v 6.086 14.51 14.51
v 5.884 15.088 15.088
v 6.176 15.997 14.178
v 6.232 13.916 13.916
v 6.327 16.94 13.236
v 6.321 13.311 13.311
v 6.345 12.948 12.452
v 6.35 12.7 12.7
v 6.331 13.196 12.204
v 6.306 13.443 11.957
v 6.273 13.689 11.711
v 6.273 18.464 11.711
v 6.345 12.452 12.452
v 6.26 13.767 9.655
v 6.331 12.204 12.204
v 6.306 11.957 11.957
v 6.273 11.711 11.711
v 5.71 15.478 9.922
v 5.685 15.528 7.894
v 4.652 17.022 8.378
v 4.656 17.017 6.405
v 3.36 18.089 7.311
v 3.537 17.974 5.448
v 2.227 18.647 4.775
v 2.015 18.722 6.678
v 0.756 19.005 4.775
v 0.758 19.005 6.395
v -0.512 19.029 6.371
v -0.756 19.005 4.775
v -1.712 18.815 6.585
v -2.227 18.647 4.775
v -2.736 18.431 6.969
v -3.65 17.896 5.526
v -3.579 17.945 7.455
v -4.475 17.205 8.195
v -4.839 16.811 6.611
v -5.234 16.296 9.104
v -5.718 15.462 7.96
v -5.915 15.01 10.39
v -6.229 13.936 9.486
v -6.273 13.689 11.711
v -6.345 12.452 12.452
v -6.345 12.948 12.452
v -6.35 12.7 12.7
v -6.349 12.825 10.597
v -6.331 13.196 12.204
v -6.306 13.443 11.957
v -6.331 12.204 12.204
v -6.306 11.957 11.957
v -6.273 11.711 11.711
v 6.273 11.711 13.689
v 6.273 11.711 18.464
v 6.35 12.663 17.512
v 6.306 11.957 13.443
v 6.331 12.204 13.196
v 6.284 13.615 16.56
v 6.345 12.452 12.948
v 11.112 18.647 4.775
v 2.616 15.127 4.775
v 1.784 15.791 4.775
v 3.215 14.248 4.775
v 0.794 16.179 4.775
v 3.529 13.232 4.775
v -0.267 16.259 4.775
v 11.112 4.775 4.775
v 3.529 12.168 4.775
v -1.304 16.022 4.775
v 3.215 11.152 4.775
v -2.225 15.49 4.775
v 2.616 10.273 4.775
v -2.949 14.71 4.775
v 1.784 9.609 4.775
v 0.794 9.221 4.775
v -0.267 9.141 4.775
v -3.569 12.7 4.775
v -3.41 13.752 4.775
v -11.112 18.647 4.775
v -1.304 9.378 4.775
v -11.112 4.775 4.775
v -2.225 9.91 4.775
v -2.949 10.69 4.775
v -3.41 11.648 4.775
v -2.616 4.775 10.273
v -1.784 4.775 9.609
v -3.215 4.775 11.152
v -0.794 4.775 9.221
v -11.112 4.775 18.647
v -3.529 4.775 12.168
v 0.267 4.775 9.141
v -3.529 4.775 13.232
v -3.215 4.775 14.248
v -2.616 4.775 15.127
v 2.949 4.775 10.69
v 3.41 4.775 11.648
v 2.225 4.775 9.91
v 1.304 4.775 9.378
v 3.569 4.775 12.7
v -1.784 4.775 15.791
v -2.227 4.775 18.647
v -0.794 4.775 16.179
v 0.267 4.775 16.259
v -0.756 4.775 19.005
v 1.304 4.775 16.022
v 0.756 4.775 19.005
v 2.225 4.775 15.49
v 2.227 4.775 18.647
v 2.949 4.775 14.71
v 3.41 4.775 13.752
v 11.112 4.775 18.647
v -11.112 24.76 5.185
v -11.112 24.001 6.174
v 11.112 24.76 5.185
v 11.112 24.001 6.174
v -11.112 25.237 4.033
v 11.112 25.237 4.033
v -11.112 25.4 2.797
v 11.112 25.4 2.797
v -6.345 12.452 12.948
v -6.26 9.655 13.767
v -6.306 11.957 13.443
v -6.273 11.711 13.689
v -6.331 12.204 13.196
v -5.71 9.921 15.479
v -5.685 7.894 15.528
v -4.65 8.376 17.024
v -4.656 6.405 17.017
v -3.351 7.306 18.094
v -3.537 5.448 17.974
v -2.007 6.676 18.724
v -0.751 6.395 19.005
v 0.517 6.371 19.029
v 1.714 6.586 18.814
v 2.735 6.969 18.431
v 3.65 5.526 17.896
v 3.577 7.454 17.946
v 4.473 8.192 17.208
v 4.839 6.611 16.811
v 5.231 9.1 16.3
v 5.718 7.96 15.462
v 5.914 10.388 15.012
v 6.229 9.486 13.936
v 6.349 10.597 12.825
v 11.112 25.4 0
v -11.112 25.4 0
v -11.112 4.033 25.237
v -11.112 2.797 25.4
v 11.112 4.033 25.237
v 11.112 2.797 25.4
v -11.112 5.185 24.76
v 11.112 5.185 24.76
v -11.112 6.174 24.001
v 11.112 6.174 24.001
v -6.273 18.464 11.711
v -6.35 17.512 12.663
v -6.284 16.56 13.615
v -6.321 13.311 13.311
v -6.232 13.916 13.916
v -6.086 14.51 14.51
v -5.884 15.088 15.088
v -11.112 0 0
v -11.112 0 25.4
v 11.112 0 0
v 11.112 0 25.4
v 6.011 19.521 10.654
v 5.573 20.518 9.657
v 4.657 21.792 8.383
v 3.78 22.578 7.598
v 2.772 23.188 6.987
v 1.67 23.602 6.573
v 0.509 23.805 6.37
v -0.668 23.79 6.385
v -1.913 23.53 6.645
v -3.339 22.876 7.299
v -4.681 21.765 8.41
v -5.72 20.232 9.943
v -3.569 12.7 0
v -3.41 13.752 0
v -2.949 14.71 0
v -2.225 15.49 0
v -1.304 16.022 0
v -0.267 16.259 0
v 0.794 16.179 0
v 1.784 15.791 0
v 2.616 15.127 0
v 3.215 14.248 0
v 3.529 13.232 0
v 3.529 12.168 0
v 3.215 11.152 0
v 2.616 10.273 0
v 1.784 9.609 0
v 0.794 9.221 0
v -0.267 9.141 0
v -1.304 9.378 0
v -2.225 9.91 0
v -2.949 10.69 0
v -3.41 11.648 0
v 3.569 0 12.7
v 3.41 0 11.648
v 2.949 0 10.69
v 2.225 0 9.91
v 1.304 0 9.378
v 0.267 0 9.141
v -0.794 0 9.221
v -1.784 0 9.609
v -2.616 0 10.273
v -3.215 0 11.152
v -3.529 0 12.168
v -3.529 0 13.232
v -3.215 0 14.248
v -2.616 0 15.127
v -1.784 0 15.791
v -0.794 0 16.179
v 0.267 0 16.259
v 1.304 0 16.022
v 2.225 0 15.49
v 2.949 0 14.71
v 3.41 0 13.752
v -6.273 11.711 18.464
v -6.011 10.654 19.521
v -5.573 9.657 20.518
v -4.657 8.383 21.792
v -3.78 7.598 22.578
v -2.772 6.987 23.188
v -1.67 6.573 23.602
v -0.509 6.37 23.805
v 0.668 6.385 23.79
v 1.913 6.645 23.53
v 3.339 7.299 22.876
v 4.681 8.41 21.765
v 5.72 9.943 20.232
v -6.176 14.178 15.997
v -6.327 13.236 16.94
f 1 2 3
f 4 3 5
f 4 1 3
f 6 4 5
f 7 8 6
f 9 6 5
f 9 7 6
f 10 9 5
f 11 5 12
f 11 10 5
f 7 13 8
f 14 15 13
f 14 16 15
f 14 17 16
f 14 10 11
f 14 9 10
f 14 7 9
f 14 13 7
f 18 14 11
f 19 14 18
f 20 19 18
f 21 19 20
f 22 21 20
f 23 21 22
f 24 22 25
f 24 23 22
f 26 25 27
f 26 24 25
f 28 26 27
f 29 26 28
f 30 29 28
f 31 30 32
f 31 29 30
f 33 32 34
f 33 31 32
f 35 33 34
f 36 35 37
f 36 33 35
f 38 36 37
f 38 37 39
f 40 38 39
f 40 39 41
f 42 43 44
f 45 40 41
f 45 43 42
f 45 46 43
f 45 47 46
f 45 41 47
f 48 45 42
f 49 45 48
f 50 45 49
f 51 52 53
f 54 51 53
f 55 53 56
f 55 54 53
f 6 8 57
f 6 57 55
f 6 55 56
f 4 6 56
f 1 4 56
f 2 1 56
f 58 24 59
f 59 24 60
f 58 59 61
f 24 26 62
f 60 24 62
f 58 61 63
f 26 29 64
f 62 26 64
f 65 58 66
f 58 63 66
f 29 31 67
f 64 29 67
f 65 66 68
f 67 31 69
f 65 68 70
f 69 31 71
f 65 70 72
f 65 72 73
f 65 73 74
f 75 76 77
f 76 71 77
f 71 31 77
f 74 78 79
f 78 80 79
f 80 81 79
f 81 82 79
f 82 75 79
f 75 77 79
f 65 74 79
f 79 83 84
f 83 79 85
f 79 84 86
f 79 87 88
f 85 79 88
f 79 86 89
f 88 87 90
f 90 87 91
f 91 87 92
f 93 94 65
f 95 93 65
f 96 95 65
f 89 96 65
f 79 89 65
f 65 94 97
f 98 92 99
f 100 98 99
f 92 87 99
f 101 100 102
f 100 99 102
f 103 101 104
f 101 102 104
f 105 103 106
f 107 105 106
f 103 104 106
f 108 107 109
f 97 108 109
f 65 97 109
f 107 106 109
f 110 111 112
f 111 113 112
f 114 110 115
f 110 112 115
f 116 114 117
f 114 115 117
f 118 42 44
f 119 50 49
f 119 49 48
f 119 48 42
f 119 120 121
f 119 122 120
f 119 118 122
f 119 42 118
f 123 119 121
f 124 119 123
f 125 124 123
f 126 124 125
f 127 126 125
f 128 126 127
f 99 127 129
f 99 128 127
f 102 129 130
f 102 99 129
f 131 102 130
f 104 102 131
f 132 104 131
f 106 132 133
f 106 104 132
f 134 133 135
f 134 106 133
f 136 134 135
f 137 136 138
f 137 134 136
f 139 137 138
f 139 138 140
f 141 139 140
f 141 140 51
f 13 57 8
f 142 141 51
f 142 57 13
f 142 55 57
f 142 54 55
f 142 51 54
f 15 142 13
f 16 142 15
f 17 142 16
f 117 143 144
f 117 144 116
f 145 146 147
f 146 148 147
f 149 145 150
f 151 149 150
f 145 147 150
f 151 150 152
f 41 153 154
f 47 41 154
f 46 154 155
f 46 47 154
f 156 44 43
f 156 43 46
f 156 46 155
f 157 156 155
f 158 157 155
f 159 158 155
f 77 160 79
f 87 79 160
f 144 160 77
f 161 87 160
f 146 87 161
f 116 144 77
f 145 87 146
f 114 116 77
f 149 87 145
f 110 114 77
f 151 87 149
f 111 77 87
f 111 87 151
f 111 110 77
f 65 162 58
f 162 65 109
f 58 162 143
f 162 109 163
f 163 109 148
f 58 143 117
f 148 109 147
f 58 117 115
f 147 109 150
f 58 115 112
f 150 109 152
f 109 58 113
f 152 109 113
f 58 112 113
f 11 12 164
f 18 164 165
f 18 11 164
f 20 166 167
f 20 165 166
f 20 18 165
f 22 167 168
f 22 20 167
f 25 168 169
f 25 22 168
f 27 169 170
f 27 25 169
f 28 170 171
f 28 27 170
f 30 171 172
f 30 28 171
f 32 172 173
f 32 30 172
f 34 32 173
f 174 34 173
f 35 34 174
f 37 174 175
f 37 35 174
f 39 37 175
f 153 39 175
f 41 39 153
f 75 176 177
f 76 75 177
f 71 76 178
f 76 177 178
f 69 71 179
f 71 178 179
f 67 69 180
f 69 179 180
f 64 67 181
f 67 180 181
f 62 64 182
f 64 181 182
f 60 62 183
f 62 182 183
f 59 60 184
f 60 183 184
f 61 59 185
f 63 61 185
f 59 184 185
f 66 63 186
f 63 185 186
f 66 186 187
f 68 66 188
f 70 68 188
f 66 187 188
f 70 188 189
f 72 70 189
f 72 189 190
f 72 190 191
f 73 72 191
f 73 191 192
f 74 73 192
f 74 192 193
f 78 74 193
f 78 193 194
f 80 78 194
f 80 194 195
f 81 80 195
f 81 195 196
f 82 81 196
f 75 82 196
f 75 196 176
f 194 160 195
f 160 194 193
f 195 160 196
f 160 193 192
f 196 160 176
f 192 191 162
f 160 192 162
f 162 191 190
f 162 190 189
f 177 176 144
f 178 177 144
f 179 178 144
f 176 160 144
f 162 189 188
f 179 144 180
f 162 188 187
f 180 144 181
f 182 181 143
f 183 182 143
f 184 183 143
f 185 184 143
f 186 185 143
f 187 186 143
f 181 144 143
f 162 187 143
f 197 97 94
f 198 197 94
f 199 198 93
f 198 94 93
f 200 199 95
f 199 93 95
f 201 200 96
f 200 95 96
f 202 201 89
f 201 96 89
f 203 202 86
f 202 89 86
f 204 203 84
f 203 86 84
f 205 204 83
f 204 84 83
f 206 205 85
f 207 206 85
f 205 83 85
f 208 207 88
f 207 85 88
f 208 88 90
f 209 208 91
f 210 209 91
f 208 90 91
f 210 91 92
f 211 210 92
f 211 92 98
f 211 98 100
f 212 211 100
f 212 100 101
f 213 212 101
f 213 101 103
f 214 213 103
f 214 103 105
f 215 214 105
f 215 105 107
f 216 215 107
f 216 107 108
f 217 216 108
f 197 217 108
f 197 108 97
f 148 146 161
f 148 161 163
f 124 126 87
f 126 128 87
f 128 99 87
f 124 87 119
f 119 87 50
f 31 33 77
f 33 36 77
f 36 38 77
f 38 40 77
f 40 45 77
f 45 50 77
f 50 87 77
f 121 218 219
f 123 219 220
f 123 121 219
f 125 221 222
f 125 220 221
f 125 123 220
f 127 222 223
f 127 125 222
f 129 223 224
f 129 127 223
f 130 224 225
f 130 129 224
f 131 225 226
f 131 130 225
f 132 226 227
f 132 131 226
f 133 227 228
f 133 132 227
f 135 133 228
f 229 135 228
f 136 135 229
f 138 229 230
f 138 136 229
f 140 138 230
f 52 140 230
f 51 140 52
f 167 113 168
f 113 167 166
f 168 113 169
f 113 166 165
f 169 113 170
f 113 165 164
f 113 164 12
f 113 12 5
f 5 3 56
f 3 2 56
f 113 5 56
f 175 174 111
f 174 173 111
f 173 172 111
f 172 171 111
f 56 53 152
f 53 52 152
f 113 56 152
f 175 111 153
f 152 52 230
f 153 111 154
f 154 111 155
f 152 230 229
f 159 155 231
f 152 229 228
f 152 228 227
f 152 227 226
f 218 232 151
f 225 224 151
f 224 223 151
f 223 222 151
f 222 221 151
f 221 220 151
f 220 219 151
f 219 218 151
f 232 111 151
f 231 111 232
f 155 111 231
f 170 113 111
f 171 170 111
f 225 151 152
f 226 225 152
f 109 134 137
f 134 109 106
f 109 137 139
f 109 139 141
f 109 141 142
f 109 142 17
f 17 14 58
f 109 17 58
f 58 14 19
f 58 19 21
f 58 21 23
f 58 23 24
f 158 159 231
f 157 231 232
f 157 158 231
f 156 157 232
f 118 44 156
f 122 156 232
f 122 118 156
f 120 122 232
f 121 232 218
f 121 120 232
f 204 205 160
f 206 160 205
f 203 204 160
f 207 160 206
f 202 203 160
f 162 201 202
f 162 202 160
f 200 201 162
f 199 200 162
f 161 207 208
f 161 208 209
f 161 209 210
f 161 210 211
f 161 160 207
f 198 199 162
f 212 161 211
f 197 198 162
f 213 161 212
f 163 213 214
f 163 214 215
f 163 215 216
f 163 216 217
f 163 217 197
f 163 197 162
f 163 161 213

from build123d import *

# Parameters (mm, degrees)
BOSS_EXTRUDE1_START      = -11.1125
BOSS_EXTRUDE1_DEPTH      = 22.225
BOSS_EXTRUDE1_START_2    = 4.7752
BOSS_EXTRUDE1_2_DEPTH    = 20.6248
BOSS_EXTRUDE1_START_3    = 4
BOSS_EXTRUDE1_3_DEPTH    = 21.4
SKETCH2_W                = 22.225
SKETCH2_H                = 25.4
BOSS_EXTRUDE2_DEPTH      = 4.7752
K_0_281_DIAMETER_HOLE1_D = 7.1374
K_0_281_DIAMETER_HOLE2_D = 7.1374
FILLET1_R                = 4.7752


with BuildPart() as part:
    # Boss-Extrude1: read off the stored shape, not the designer's step
    # Boss-Extrude1 outline → Boss-Extrude1 (new body)
    with BuildSketch(Plane.YZ.offset(BOSS_EXTRUDE1_START)):
        Polygon((25.4, 4.7752), (4.7752, 25.4), (4.7752, 18.646847397), (18.646847397, 4.7752), (4.7752, 4.7752), (4.7752, 0), (25.4, 0), align=None)
    extrude(amount=BOSS_EXTRUDE1_DEPTH)

    # Boss-Extrude1 2 outline → Boss-Extrude1 2 (cut)
    with BuildSketch(Plane.XY.offset(BOSS_EXTRUDE1_START_2)):
        with BuildLine():
            ThreePointArc((6.272513521, 11.711023698), (0, 19.05), (-6.272513521, 11.711023698))
            ThreePointArc((-6.272513521, 11.711023698), (0, 6.35), (6.272513521, 11.711023698))
        make_face()
    extrude(amount=BOSS_EXTRUDE1_2_DEPTH, mode=Mode.SUBTRACT)

    # Boss-Extrude1 3 outline → Boss-Extrude1 3 (cut)
    with BuildSketch(Plane(origin=(0, 0, 0), x_dir=(1, 0, 0), z_dir=(0, 1, 0)).offset(BOSS_EXTRUDE1_START_3)):
        with BuildLine():
            ThreePointArc((-6.272513521, -11.711023698), (0, -19.05), (6.272513521, -11.711023698))
            ThreePointArc((6.272513521, -11.711023698), (0, -6.35), (-6.272513521, -11.711023698))
        make_face()
    extrude(amount=BOSS_EXTRUDE1_3_DEPTH, mode=Mode.SUBTRACT)

    # Sketch2 → Boss-Extrude2 (add)
    with BuildSketch(Plane.XZ.offset(-4.7752)):
        with Locations((0, 12.7)):
            Rectangle(SKETCH2_W, SKETCH2_H)
    extrude(amount=BOSS_EXTRUDE2_DEPTH)

    # K (0.281) Diameter Hole1 (through all)
    with Locations(Plane(origin=(0, 0, 0), x_dir=(-1, 0, 0), z_dir=(0, -1, 0))):
        with Locations((0, -12.7)):
            Hole(K_0_281_DIAMETER_HOLE1_D / 2)

    # K (0.281) Diameter Hole2 (through all)
    with Locations(Plane.XY.offset(4.7752)):
        with Locations((0, 12.7)):
            Hole(K_0_281_DIAMETER_HOLE2_D / 2)

    # Fillet1
    fillet1_edges = [part.edges().sort_by_distance(p)[0] for p in [
        (0, 25.4, 4.7752),
        (0, 4.7752, 25.4),
    ]]
    fillet(fillet1_edges, radius=FILLET1_R)


solid = part.part
